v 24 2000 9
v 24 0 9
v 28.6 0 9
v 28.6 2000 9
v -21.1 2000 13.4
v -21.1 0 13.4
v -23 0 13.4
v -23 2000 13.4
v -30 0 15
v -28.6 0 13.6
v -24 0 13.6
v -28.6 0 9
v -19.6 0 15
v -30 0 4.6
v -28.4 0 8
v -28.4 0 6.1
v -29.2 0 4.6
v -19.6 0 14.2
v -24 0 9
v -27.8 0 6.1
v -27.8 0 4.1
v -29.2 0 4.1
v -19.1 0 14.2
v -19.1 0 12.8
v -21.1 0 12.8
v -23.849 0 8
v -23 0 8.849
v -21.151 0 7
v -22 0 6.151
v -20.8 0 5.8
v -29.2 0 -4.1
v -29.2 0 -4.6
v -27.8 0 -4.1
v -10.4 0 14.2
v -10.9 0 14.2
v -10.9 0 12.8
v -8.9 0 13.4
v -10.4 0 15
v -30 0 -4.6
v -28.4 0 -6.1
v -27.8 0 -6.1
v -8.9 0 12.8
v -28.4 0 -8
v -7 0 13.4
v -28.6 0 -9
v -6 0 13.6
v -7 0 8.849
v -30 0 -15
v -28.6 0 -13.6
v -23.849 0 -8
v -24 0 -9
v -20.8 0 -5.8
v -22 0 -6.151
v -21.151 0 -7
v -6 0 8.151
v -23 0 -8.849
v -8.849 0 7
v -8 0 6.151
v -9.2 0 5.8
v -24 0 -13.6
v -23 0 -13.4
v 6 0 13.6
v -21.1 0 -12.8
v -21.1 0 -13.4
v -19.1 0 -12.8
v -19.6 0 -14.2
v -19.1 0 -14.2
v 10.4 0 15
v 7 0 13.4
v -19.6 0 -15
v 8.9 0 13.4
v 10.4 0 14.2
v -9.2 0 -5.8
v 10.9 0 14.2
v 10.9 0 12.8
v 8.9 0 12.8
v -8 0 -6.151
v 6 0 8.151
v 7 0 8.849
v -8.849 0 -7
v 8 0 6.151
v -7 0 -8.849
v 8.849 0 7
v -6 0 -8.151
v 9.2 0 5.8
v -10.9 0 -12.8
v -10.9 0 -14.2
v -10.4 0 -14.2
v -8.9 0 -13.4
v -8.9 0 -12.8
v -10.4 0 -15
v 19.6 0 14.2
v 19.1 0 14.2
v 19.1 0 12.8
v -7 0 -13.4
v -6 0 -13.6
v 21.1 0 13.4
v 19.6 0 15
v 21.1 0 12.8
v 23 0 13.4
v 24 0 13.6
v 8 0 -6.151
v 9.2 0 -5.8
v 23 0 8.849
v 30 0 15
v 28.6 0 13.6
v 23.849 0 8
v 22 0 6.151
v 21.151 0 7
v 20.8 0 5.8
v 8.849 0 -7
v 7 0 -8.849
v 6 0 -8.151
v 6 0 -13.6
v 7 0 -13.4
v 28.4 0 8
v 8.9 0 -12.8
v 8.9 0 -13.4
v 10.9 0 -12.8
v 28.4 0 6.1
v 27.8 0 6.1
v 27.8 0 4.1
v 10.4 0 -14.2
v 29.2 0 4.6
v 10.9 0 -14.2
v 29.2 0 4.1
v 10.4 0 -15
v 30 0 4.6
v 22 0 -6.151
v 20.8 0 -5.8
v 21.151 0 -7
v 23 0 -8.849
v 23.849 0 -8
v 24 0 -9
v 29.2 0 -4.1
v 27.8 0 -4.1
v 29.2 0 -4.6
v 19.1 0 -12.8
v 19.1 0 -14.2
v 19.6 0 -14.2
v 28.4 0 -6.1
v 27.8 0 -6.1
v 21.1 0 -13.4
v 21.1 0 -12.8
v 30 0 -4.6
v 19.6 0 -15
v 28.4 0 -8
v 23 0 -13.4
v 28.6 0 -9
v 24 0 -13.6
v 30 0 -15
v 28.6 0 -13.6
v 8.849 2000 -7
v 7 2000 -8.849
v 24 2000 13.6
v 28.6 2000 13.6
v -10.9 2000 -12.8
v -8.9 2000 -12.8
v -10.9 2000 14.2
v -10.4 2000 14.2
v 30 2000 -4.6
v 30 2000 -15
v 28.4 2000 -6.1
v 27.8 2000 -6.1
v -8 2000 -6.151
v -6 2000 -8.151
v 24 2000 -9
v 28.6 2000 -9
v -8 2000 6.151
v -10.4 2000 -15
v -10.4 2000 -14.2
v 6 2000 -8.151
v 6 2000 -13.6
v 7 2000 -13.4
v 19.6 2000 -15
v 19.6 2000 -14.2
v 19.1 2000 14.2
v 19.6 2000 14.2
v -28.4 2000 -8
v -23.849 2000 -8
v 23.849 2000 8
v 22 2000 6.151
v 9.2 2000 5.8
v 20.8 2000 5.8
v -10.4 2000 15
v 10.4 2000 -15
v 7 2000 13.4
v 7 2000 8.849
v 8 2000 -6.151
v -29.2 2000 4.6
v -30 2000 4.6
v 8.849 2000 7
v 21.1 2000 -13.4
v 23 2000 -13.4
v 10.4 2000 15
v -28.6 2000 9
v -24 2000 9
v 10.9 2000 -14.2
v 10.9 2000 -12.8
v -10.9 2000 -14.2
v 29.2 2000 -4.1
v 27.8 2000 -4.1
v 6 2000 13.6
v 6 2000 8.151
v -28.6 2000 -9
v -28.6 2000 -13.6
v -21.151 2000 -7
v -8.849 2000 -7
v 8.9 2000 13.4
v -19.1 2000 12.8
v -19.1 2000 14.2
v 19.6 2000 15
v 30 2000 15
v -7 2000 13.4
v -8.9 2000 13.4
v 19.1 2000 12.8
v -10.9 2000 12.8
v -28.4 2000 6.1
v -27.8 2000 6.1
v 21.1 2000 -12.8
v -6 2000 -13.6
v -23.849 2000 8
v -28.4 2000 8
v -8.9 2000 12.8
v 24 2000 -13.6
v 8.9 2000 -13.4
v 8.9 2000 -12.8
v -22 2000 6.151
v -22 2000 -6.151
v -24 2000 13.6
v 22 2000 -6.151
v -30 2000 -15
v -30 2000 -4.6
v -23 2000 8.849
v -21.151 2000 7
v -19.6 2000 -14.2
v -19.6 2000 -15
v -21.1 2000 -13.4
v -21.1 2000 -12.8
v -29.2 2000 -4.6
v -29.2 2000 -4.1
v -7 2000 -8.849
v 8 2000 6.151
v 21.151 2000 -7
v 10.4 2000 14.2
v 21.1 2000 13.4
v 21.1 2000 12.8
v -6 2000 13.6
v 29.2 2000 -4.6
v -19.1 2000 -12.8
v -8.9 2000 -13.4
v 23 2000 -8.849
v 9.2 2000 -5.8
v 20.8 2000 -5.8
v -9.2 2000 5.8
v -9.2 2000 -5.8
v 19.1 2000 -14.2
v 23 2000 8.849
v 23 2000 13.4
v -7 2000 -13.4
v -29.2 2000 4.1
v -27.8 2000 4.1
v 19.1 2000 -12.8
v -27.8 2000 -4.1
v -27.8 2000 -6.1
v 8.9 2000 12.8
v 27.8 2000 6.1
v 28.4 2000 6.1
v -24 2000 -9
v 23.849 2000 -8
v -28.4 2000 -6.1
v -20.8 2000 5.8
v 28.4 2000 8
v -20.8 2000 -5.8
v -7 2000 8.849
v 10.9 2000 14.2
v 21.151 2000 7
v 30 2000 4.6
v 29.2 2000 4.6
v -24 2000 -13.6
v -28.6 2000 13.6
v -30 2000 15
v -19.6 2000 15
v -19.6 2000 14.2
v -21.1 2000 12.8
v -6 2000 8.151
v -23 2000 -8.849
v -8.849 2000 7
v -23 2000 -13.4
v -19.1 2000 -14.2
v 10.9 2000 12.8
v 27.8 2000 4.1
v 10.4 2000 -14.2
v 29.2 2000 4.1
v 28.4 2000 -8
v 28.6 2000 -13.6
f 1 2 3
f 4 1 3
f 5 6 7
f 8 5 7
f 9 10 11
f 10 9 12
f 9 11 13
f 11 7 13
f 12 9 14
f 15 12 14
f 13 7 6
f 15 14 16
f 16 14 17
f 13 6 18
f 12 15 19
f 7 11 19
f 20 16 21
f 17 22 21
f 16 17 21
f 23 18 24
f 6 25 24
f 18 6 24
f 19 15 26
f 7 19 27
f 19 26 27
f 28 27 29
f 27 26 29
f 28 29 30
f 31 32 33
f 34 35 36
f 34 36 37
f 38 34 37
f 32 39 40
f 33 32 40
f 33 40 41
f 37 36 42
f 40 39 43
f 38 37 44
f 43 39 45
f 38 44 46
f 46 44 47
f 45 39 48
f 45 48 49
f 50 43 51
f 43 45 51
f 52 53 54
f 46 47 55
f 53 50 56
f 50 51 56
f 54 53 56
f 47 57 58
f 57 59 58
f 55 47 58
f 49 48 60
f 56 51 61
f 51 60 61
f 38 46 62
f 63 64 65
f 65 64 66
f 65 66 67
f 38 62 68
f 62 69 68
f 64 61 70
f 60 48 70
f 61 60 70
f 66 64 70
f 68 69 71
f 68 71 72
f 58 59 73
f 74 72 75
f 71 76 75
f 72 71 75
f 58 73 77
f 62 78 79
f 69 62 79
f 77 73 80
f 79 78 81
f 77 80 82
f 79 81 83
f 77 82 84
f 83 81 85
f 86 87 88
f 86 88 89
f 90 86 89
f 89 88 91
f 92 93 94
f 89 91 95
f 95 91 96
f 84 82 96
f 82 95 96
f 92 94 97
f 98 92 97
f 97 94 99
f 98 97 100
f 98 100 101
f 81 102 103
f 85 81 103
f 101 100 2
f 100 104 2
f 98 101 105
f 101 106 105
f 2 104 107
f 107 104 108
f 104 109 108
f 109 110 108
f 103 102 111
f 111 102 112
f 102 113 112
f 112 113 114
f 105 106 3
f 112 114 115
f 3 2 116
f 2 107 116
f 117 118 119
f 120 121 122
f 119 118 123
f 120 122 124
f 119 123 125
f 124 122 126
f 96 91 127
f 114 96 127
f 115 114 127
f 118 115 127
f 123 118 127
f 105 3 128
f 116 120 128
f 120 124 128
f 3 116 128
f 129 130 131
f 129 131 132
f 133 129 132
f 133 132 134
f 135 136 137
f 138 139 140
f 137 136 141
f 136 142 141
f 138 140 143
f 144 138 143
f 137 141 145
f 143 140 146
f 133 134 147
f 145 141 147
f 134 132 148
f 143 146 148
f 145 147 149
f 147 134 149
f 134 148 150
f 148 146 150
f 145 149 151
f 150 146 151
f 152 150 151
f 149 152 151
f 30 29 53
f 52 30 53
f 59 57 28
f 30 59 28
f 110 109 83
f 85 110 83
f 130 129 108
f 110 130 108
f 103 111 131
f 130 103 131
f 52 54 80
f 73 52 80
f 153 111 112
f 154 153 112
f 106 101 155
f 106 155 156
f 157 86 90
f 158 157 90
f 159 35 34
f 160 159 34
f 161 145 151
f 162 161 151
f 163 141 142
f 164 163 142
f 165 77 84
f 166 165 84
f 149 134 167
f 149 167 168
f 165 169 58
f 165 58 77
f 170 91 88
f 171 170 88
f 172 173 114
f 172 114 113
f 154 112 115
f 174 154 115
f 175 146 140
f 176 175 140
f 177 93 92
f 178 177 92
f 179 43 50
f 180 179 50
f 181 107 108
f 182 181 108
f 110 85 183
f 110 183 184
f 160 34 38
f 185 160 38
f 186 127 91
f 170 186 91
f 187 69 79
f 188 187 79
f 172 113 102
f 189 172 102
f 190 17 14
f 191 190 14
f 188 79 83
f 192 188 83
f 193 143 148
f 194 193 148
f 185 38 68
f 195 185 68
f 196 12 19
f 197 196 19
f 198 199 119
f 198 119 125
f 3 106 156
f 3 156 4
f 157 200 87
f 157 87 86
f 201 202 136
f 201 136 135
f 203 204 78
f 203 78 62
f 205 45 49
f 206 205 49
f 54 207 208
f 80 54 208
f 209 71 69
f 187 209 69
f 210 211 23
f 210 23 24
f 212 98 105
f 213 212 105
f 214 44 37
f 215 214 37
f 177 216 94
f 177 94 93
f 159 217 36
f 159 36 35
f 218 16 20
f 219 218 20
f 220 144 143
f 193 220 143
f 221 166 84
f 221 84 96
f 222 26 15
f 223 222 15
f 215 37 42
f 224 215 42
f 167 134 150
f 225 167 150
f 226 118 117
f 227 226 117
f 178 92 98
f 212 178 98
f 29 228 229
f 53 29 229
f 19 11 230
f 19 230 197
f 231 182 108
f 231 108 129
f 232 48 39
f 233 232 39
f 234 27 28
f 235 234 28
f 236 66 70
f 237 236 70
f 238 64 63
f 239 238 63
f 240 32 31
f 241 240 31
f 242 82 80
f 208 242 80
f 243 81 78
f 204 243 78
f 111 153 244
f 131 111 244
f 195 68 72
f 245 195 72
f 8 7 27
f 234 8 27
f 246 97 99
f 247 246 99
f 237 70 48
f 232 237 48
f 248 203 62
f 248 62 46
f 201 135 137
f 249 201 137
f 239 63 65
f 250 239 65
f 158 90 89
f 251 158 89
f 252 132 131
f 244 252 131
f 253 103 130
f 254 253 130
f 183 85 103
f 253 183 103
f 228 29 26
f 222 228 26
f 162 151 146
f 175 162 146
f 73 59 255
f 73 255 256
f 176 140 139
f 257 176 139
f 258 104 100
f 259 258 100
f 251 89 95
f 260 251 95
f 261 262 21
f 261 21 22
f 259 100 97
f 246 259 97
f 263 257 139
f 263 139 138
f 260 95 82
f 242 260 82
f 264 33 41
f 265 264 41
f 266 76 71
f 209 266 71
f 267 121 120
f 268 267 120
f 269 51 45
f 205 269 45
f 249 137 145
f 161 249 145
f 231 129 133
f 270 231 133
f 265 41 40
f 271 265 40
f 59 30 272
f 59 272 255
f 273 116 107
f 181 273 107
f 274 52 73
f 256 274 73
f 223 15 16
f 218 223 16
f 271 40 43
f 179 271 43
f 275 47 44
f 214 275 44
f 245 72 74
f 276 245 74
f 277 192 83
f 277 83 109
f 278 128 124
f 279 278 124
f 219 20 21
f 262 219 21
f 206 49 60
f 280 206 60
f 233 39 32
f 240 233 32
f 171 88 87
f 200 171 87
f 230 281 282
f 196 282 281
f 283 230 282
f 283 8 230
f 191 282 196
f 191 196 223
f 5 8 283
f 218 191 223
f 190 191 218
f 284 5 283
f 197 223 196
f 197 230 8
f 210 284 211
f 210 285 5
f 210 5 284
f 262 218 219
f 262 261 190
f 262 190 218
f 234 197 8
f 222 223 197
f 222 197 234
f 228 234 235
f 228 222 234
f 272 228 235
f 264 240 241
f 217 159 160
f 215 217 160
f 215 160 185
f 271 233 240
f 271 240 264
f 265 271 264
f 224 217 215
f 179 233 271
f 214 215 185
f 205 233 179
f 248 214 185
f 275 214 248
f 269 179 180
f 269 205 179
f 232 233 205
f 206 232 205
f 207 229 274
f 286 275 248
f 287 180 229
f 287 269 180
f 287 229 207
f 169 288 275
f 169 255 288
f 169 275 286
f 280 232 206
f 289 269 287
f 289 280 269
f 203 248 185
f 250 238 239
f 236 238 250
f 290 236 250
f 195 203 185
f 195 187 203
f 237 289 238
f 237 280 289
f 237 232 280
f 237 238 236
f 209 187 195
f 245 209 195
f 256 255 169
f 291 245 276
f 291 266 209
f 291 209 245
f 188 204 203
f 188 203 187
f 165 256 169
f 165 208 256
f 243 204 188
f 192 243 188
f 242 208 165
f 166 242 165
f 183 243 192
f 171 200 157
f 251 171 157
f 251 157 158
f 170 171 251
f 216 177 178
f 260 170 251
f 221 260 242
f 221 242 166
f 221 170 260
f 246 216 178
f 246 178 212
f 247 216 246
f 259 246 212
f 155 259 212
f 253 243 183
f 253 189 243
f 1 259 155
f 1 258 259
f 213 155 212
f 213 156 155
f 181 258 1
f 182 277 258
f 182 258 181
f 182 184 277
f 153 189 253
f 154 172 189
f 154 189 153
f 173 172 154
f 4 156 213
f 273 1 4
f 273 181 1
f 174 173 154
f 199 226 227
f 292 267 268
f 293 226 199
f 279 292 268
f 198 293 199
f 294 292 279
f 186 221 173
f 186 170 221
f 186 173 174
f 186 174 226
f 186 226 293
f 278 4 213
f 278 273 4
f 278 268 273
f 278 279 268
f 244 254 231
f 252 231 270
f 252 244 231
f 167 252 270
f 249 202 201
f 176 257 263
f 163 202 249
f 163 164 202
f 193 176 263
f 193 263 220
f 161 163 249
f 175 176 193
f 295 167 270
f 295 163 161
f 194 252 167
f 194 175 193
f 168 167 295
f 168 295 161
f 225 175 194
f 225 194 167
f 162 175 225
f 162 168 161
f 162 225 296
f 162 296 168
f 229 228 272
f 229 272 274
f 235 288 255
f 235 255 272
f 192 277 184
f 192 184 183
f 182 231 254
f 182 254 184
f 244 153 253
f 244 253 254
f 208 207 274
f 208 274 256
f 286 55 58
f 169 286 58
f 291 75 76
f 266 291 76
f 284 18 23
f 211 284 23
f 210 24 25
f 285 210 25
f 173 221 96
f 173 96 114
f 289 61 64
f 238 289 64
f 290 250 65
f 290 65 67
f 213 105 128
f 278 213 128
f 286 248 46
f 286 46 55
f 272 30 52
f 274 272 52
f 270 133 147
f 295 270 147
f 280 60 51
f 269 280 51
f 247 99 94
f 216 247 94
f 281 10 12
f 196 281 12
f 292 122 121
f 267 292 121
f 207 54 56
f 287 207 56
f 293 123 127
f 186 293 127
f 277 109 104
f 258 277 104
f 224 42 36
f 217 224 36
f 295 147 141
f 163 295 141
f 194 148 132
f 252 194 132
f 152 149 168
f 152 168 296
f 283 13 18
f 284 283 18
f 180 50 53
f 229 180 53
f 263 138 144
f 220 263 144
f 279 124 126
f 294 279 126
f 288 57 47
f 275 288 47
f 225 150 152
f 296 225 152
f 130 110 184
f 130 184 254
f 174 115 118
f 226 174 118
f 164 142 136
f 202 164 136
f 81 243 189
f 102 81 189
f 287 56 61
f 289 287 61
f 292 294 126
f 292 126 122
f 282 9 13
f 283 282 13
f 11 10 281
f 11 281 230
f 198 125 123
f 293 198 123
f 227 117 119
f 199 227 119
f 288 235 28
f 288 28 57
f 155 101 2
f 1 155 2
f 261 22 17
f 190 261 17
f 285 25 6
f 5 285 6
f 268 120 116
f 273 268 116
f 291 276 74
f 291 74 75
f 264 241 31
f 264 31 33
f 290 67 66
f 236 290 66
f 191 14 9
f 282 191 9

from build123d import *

# Parameters (mm, degrees)
SKETCH_1_W      = 14
SKETCH_1_H      = 14
SKETCH_1_W_2    = 11.6
SKETCH_1_H_2    = 11.6
SKETCH_1_W_3    = 4.6
SKETCH_1_H_3    = 4.6
EXTRUDE_2_DEPTH = 2000


with BuildPart() as part:
    # Эскиз1 → Бобышка-Вытянуть2 (new body)
    # profile 1 of 9: a face of its own
    with BuildSketch(Plane(origin=(0, 0, 0), x_dir=(1, 0, 0), z_dir=(0, 1, 0))):
        Polygon((8, -7), (8, -6.151471863), (6, -8.151471863), (6, -13.6), (-6, -13.6), (-6, -8.151471863), (-8, -6.151471863), (-8, -7), (-8.848528137, -7), (-7, -8.848528137), (-7, -13.4), (-8.9, -13.4), (-8.9, -12.8), (-10.9, -12.8), (-10.9, -14.2), (-10.4, -14.2), (-10.4, -15), (10.4, -15), (10.4, -14.2), (10.9, -14.2), (10.9, -12.8), (8.9, -12.8), (8.9, -13.4), (7, -13.4), (7, -8.848528137), (8.848528137, -7), align=None)
    # profile 2 of 9: a face of its own
    with BuildSketch(Plane(origin=(0, 0, 0), x_dir=(1, 0, 0), z_dir=(0, 1, 0))):
        with Locations((-15, 0)):
            Rectangle(SKETCH_1_W, SKETCH_1_H)
        with Locations((-15, 0)):
            Rectangle(SKETCH_1_W_2, SKETCH_1_H_2, mode=Mode.SUBTRACT)
    # profile 3 of 9: a face of its own
    with BuildSketch(Plane(origin=(0, 0, 0), x_dir=(1, 0, 0), z_dir=(0, 1, 0))):
        Polygon((-23, -8.848528137), (-21.151471863, -7), (-22, -7), (-22, -6.151471863), (-23.848528137, -8), (-28.4, -8), (-28.4, -6.1), (-27.8, -6.1), (-27.8, -4.1), (-29.2, -4.1), (-29.2, -4.6), (-30, -4.6), (-30, -15), (-19.6, -15), (-19.6, -14.2), (-19.1, -14.2), (-19.1, -12.8), (-21.1, -12.8), (-21.1, -13.4), (-23, -13.4), align=None)
        with Locations((-26.3, -11.3)):
            Rectangle(SKETCH_1_W_3, SKETCH_1_H_3, mode=Mode.SUBTRACT)
    # profile 4 of 9: a face of its own
    with BuildSketch(Plane(origin=(0, 0, 0), x_dir=(1, 0, 0), z_dir=(0, 1, 0))):
        with Locations((15, 0)):
            Rectangle(SKETCH_1_W, SKETCH_1_H)
        with Locations((15, 0)):
            Rectangle(SKETCH_1_W_2, SKETCH_1_H_2, mode=Mode.SUBTRACT)
    # profile 5 of 9: a face of its own
    with BuildSketch(Plane(origin=(0, 0, 0), x_dir=(1, 0, 0), z_dir=(0, 1, 0))):
        Polygon((23.848528137, -8), (22, -6.151471863), (22, -7), (21.151471863, -7), (23, -8.848528137), (23, -13.4), (21.1, -13.4), (21.1, -12.8), (19.1, -12.8), (19.1, -14.2), (19.6, -14.2), (19.6, -15), (30, -15), (30, -4.6), (29.2, -4.6), (29.2, -4.1), (27.8, -4.1), (27.8, -6.1), (28.4, -6.1), (28.4, -8), align=None)
        with Locations((26.3, -11.3)):
            Rectangle(SKETCH_1_W_3, SKETCH_1_H_3, mode=Mode.SUBTRACT)
    # profile 6 of 9: a face of its own
    with BuildSketch(Plane(origin=(0, 0, 0), x_dir=(1, 0, 0), z_dir=(0, 1, 0))):
        Polygon((21.151471863, 7), (22, 7), (22, 6.151471863), (23.848528137, 8), (28.4, 8), (28.4, 6.1), (27.8, 6.1), (27.8, 4.1), (29.2, 4.1), (29.2, 4.6), (30, 4.6), (30, 15), (19.6, 15), (19.6, 14.2), (19.1, 14.2), (19.1, 12.8), (21.1, 12.8), (21.1, 13.4), (23, 13.4), (23, 8.848528137), align=None)
        with Locations((26.3, 11.3)):
            Rectangle(SKETCH_1_W_3, SKETCH_1_H_3, mode=Mode.SUBTRACT)
    # profile 7 of 9: a face of its own
    with BuildSketch(Plane(origin=(0, 0, 0), x_dir=(1, 0, 0), z_dir=(0, 1, 0))):
        Polygon((8, 7), (8.848528137, 7), (7, 8.848528137), (7, 13.4), (8.9, 13.4), (8.9, 12.8), (10.9, 12.8), (10.9, 14.2), (10.4, 14.2), (10.4, 15), (-10.4, 15), (-10.4, 14.2), (-10.9, 14.2), (-10.9, 12.8), (-8.9, 12.8), (-8.9, 13.4), (-7, 13.4), (-7, 8.848528137), (-8.848528137, 7), (-8, 7), (-8, 6.151471863), (-6, 8.151471863), (-6, 13.6), (6, 13.6), (6, 8.151471863), (8, 6.151471863), align=None)
    # profile 8 of 9: a face of its own
    with BuildSketch(Plane(origin=(0, 0, 0), x_dir=(1, 0, 0), z_dir=(0, 1, 0))):
        Polygon((-22, 7), (-21.151471863, 7), (-23, 8.848528137), (-23, 13.4), (-21.1, 13.4), (-21.1, 12.8), (-19.1, 12.8), (-19.1, 14.2), (-19.6, 14.2), (-19.6, 15), (-30, 15), (-30, 13.6), (-28.6, 13.6), (-24, 13.6), (-24, 9), (-24, 8.151471863), (-23.848528137, 8), (-22, 6.151471863), align=None)
    # profile 9 of 9: a face of its own
    with BuildSketch(Plane(origin=(0, 0, 0), x_dir=(1, 0, 0), z_dir=(0, 1, 0))):
        Polygon((-28.6, 13.6), (-30, 13.6), (-30, 4.6), (-29.2, 4.6), (-29.2, 4.1), (-27.8, 4.1), (-27.8, 6.1), (-28.4, 6.1), (-28.4, 8), (-23.848528137, 8), (-24, 8.151471863), (-24, 9), (-28.6, 9), align=None)
    extrude(amount=EXTRUDE_2_DEPTH)


solid = part.part
